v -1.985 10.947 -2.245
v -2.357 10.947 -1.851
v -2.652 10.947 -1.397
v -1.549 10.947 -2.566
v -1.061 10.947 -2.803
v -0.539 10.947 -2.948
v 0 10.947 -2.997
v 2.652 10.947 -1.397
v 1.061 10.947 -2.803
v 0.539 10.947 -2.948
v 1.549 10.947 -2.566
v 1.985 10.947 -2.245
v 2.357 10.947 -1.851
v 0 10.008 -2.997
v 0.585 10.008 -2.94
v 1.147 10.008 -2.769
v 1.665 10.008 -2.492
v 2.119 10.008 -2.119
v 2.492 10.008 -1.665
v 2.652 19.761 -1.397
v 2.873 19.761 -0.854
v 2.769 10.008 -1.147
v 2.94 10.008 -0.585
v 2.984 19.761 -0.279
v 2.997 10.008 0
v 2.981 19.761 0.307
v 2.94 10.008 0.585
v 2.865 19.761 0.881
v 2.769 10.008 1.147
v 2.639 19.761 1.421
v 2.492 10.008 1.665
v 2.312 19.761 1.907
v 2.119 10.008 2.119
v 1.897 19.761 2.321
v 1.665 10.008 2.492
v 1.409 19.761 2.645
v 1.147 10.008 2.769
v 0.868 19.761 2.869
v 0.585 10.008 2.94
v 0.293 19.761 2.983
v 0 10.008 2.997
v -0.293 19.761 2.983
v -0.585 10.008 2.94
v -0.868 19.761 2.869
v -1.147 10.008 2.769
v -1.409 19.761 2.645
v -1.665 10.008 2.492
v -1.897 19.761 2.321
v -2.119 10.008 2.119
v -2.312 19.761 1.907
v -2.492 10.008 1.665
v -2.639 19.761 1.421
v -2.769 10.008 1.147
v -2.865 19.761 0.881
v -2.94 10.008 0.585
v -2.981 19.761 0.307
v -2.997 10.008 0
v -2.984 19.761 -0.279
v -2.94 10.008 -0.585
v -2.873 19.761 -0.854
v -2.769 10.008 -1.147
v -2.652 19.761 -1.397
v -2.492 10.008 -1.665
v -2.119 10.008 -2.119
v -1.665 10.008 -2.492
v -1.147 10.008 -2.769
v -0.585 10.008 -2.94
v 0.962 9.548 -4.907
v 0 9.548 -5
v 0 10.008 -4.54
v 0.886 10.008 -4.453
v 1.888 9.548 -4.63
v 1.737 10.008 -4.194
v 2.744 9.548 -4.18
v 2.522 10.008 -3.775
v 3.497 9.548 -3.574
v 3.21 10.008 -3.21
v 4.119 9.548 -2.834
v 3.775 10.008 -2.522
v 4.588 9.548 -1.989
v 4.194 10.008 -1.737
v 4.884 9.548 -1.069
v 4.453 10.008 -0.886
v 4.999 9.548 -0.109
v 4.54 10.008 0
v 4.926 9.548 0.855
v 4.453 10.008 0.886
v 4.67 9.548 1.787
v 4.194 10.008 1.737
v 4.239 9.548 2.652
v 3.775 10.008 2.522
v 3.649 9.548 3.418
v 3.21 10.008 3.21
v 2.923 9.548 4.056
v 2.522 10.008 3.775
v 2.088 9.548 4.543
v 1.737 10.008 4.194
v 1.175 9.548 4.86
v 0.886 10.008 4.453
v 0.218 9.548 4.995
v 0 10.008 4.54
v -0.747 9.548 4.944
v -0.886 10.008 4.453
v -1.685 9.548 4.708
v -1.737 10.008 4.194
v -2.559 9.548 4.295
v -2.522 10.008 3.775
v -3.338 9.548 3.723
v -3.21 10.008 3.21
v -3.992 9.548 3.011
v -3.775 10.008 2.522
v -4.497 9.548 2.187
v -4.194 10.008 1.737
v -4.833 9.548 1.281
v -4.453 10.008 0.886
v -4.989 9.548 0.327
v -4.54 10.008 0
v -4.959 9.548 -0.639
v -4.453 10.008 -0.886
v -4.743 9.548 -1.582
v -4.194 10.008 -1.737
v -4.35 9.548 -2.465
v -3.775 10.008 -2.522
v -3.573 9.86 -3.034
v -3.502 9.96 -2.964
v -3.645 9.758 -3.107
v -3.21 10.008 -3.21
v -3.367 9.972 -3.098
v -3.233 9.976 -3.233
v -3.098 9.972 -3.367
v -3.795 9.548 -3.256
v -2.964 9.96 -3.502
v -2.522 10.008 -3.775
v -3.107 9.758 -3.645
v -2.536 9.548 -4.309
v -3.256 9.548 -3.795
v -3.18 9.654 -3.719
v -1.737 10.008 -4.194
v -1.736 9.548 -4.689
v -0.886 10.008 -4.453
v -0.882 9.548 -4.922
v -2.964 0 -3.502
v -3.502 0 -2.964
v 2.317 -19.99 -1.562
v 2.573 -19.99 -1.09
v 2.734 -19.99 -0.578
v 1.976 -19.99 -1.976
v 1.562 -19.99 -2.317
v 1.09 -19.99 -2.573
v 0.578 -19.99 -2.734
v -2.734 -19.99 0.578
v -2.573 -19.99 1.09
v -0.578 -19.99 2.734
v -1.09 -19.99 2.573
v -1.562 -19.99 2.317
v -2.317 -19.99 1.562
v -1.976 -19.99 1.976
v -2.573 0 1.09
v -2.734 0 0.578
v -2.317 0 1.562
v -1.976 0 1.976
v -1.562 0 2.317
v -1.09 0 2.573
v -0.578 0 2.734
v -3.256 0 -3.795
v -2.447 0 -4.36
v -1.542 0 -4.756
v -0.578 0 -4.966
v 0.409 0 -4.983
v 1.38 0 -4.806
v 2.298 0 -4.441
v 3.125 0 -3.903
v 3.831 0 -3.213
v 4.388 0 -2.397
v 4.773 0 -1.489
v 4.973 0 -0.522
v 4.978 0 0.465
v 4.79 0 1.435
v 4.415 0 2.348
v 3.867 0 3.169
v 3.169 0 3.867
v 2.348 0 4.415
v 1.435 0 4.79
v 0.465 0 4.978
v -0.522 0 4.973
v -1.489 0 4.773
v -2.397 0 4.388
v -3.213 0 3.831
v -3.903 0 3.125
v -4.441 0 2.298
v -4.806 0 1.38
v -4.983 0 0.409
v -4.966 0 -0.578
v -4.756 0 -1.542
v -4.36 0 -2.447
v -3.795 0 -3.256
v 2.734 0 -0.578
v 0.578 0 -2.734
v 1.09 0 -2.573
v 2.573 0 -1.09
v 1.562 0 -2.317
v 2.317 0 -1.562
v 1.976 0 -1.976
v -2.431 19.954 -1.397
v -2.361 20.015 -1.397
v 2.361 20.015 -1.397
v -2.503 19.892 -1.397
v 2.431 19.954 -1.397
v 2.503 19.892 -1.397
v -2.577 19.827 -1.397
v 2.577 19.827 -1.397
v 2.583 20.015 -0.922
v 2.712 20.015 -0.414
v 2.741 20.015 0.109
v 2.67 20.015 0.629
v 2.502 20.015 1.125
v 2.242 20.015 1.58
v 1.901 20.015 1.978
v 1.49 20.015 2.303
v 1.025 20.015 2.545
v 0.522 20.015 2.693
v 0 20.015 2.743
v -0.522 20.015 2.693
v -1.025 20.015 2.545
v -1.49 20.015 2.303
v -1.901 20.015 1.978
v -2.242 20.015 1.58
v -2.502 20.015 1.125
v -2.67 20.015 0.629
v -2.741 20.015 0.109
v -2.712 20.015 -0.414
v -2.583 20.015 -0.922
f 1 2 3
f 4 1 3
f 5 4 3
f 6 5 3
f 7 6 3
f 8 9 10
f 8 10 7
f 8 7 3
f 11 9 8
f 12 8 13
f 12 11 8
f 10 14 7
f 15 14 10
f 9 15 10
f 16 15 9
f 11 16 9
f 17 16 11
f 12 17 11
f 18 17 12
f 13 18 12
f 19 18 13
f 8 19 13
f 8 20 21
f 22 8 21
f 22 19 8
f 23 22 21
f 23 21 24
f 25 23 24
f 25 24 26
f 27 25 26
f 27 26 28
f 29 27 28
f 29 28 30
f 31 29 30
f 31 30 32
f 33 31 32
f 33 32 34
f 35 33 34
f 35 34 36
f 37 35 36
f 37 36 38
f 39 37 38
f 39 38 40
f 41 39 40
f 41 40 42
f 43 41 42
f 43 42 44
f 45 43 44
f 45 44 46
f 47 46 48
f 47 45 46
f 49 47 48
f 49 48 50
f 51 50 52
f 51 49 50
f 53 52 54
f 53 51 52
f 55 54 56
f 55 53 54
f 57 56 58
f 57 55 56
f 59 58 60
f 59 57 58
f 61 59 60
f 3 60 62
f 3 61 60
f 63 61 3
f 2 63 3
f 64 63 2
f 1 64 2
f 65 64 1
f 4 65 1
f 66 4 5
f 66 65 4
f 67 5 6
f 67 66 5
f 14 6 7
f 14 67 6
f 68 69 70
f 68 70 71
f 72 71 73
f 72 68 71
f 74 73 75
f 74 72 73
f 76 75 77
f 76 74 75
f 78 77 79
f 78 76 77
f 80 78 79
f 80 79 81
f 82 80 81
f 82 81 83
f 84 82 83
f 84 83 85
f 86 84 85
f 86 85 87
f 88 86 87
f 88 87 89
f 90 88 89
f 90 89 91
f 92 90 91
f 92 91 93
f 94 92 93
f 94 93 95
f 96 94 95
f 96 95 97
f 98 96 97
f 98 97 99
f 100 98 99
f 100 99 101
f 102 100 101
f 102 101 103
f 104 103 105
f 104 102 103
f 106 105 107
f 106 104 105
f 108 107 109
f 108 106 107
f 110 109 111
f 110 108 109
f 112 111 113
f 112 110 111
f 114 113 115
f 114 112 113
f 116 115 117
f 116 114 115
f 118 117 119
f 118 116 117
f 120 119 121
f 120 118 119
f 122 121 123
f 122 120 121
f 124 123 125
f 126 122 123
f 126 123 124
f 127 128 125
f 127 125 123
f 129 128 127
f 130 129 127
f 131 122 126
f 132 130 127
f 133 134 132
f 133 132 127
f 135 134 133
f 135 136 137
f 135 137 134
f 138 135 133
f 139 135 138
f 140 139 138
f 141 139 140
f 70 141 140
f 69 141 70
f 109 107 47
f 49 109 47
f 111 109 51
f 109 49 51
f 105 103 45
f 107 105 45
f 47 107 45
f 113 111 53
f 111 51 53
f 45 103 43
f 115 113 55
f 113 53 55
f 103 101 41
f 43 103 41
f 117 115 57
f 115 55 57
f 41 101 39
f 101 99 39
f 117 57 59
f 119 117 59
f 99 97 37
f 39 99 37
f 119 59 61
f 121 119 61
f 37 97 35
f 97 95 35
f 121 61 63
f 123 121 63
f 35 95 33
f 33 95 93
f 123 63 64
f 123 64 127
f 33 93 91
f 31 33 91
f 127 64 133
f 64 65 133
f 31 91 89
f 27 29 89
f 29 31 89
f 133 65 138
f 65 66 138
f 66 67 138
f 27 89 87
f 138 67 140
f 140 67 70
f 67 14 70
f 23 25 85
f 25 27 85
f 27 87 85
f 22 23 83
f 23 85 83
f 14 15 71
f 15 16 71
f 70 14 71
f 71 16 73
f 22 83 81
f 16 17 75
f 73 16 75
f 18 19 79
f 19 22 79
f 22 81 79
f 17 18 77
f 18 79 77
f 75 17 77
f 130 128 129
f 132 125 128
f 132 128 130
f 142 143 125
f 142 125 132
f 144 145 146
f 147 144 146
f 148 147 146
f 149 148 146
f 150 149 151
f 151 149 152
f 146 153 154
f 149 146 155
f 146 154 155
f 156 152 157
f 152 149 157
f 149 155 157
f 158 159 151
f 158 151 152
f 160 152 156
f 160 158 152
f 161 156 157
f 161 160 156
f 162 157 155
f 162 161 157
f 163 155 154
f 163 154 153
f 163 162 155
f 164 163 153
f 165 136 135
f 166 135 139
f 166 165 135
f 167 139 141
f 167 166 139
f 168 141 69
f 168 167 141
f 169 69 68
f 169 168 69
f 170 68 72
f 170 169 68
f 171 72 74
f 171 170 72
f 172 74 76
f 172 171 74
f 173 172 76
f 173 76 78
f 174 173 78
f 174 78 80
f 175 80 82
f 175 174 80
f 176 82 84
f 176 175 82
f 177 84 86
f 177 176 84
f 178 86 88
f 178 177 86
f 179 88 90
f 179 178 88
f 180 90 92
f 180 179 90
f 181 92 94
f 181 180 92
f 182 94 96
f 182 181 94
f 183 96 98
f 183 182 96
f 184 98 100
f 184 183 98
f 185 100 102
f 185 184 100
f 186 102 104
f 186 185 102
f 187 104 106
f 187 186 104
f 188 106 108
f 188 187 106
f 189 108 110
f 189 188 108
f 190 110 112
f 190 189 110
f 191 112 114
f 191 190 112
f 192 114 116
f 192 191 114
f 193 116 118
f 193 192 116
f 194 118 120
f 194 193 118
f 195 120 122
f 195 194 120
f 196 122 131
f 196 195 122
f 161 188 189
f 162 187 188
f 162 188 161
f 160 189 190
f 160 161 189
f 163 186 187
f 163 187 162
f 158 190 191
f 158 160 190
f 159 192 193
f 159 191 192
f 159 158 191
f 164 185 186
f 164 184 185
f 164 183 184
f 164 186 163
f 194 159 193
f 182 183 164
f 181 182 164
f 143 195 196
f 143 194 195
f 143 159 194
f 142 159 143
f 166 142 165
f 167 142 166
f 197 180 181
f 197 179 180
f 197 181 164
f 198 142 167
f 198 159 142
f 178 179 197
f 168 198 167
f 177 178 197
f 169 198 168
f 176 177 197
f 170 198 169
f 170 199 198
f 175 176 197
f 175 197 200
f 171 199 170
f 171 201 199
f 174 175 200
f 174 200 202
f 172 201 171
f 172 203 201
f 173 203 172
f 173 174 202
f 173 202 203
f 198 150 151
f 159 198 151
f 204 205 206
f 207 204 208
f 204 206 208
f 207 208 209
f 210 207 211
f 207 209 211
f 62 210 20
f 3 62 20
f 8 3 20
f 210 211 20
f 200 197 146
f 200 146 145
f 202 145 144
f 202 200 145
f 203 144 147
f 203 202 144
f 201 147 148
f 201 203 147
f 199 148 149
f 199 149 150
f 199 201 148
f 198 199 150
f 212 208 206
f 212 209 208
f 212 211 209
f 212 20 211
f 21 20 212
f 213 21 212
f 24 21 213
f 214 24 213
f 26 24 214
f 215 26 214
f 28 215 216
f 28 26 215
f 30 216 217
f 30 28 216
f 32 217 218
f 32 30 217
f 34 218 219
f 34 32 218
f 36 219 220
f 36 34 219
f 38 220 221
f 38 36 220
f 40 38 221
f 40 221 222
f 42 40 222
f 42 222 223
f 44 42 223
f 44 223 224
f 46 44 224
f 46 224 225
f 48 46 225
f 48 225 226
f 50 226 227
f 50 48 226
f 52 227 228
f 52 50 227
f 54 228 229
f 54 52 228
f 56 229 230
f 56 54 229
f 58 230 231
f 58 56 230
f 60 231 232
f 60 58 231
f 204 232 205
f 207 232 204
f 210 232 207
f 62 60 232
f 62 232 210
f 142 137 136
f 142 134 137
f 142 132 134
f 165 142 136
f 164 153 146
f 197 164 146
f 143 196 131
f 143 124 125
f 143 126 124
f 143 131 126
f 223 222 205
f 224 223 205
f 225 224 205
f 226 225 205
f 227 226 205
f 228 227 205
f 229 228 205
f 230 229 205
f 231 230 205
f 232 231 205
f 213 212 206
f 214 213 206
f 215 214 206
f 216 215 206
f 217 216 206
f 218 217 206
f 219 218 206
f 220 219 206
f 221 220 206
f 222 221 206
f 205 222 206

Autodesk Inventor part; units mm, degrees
sketch "Sketch_2" plane through (0, 0, 0) normal (1, 0, 0) x (0, 1, 0)
  line L0 (0, 0) -> (20.0152, 0)
  line L1 (20.0152, 0) -> (20.0152, -2.7432)
  line L2 (20.0152, -2.7432) -> (19.7612, -2.9972)
  line L3 (19.7612, -2.9972) -> (10.0076, -2.9972)
  line L4 (10.0076, -2.9972) -> (10.0076, -4.54)
  line L5 (10.0076, -4.54) -> (9.5476, -5)
  line L6 (9.5476, -5) -> (0, -5)
  line L7 (0, -5) -> (0, 0)
  line L8 (0, 0) -> (20.0152, 0)
revolve "Revolution1" add sketch "Sketch_2" angle 360 about axis through (0, 0, 0) along (0, -1, 0)
thread "Thread1" size "M10x0.75" class "6g" standard "ISO Metric profile" full length
sketch "Sketch_3" plane through (0, 20.0152, 0) normal (0, 1, 0) x (1, 0, 0)
  line L0 (-2.6517, 1.397) -> (2.6517, 1.397)
  arc A0 (2.6517, 1.397) -> (-2.6517, 1.397) centre (0, 0) ccw
extrude "Extrusion1" cut sketch "Sketch_3" against normal blind 9.0678
sketch "Sketch_5" plane through (0, 0, 0) normal (0, 1, 0) x (-1, 0, 0)
  arc A0 (2.7335, 0.5782) -> (0.5782, 2.7335) centre (0, 0) ccw
  line L0 (0.5782, 2.7335) -> (-2.7335, -0.5782)
  arc A1 (-2.7335, -0.5782) -> (-0.5782, -2.7335) centre (0, 0) ccw
  line L1 (-0.5782, -2.7335) -> (2.7335, 0.5782)
extrude "Extrusion2" add sketch "Sketch_5" against normal blind 19.9898
sketch "Sketch_10" plane through (0, 0, 0) normal (0, 1, 0) x (-1, 0, 0)
  line L0 (4.0411, -3.5023) -> (3.5023, -2.9635)
  line L1 (3.5023, -2.9635) -> (2.9635, -3.5023)
  line L2 (2.9635, -3.5023) -> (3.5023, -4.0411)
  line L3 (3.5023, -4.0411) -> (4.0411, -3.5023)
extrude "Extrusion3" cut sketch "Sketch_10" along normal blind 25.4
ref_plane "at518_XY" through (0, 3.4925, 0) normal (0, -1, 0) x (1, 0, 0)
ref_plane "at518_YZ" through (0, 3.4925, 0) normal (1, 0, 0) x (0, 0, 1)
ref_plane "at518_ZX" through (0, 3.4925, 0) normal (0, 0, 1) x (0, -1, 0)
ref_plane "at520_XY" through (0, 2.5019, 0) normal (0, -1, 0) x (1, 0, 0)
ref_plane "at520_YZ" through (0, 2.5019, 0) normal (1, 0, 0) x (0, 0, 1)
ref_plane "at520_ZX" through (0, 2.5019, 0) normal (0, 0, 1) x (0, -1, 0)
ref_plane "at526_a_XY" through (0, 1.0033, 0) normal (0, -1, 0) x (1, 0, 0)
ref_plane "at526_a_YZ" through (0, 1.0033, 0) normal (1, 0, 0) x (0, 0, 1)
ref_plane "at526_a_ZX" through (0, 1.0033, 0) normal (0, 0, 1) x (0, -1, 0)
ref_plane "at526_b_XY" through (0, 4.9911, 0) normal (0, -1, 0) x (1, 0, 0)
ref_plane "at526_b_YZ" through (0, 4.9911, 0) normal (1, 0, 0) x (0, 0, 1)
ref_plane "at526_b_ZX" through (0, 4.9911, 0) normal (0, 0, 1) x (0, -1, 0)
ref_plane "to_body_XY" through (0, 0, 0) normal (0, 1, 0) x (1, 0, 0)
ref_plane "to_body_YZ" through (0, 0, 0) normal (1, 0, 0) x (0, 0, -1)
ref_plane "to_body_ZX" through (0, 0, 0) normal (0, 0, -1) x (0, 1, 0)
properties part number "HS13Z-D-shaft"
